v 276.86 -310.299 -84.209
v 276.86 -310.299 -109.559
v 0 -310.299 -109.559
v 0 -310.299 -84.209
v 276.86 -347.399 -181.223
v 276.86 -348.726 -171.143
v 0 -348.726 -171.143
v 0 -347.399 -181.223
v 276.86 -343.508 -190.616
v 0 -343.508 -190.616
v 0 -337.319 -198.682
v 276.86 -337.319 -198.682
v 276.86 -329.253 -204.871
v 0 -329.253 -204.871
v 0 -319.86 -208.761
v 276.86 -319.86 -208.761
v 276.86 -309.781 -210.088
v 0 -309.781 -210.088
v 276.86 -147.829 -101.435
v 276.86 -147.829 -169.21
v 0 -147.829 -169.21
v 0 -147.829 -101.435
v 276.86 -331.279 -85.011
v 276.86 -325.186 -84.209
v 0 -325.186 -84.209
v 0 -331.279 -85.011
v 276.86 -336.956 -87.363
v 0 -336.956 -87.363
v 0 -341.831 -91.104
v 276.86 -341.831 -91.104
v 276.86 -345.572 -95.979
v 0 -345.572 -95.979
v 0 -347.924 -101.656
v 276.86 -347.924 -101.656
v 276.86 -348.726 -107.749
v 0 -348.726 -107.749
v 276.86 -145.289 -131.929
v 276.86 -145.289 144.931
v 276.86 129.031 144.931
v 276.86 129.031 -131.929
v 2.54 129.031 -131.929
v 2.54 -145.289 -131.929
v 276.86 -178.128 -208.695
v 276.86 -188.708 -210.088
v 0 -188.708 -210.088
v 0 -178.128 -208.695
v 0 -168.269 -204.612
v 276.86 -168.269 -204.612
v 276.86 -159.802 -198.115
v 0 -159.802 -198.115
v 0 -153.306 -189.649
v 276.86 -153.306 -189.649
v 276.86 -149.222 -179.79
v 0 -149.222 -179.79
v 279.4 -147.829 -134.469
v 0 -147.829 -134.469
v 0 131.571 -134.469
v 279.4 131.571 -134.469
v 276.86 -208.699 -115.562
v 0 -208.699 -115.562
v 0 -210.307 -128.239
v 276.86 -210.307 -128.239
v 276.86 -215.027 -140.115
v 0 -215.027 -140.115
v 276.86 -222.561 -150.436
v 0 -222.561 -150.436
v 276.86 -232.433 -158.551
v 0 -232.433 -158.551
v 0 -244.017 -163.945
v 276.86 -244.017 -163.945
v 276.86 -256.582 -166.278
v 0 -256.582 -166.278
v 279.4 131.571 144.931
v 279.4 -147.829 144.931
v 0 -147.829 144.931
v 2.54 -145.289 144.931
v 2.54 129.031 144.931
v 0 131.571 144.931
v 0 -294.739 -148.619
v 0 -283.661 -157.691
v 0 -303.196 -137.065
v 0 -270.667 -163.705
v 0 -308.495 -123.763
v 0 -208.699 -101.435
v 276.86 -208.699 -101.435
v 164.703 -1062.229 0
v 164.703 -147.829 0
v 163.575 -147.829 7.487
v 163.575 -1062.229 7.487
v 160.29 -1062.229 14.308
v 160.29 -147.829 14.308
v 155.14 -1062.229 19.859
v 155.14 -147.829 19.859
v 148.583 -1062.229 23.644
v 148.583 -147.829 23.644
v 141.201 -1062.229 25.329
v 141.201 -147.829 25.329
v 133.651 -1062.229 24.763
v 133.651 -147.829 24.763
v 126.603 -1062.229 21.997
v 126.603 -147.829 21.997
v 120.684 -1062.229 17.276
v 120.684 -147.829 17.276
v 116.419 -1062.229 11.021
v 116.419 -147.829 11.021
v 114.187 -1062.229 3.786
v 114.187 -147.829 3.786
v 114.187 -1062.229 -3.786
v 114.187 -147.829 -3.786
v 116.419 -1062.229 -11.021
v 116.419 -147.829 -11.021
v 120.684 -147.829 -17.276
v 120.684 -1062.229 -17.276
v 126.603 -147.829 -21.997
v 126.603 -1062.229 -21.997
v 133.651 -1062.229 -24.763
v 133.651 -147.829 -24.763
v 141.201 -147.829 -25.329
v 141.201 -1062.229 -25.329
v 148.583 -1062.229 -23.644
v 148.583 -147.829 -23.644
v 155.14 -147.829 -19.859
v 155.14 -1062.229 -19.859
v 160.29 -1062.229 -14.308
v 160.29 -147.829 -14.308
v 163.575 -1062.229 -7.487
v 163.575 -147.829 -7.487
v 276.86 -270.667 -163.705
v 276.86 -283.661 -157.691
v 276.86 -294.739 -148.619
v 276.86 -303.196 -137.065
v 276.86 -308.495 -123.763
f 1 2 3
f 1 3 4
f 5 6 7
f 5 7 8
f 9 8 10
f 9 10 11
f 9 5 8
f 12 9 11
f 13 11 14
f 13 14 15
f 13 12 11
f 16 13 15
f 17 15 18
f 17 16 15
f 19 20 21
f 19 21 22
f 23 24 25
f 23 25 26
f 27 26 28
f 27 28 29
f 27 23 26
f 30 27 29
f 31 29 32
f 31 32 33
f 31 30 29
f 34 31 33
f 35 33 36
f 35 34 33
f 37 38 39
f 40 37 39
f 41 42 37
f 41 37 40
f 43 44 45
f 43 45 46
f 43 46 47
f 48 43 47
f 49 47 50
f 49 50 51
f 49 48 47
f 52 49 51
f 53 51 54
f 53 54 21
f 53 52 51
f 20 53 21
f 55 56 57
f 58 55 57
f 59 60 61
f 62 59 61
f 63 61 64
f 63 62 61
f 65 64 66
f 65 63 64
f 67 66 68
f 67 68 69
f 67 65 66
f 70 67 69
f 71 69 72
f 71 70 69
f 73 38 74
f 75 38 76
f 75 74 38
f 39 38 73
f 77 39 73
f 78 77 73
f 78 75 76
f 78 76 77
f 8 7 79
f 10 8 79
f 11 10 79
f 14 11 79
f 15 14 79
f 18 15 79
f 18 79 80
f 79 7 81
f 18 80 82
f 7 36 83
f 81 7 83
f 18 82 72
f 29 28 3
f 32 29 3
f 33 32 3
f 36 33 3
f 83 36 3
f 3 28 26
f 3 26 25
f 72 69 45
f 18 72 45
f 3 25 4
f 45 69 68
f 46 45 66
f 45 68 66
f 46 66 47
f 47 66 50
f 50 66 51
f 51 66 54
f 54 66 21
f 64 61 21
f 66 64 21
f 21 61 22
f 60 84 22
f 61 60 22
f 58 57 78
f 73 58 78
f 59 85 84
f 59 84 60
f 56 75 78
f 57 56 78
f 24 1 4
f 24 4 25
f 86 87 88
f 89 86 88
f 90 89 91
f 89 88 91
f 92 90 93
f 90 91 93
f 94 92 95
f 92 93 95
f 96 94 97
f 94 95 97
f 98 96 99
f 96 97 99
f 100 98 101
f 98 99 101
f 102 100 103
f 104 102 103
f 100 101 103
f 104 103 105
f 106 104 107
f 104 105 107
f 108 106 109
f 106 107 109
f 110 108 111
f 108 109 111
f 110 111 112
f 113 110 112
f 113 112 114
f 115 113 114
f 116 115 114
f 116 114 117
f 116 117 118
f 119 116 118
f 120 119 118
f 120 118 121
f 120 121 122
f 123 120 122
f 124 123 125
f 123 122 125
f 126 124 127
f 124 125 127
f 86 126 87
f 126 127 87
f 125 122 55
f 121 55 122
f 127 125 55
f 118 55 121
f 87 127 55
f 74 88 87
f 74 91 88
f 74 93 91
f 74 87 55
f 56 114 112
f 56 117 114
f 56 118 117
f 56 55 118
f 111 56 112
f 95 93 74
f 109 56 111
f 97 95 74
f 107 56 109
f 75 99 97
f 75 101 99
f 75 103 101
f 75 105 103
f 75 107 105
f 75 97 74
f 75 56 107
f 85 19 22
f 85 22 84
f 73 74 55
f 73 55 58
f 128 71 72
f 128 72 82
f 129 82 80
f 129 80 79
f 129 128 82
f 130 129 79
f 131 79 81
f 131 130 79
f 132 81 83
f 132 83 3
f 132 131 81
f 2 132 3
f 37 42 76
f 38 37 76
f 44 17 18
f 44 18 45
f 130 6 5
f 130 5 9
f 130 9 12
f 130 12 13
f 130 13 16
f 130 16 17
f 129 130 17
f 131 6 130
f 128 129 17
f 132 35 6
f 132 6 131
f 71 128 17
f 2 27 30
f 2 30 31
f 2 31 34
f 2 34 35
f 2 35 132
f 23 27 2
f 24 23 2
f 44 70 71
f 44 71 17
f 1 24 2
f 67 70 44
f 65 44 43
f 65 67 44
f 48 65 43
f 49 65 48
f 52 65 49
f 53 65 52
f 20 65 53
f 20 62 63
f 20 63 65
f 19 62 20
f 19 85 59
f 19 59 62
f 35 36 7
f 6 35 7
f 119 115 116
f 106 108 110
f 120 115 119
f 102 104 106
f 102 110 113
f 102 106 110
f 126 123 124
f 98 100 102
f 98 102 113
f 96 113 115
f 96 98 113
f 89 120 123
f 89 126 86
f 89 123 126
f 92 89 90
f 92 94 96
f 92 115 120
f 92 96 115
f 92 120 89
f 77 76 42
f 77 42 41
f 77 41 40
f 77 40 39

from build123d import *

# Parameters (mm, degrees)
F0_W     = 279.4
F0_H     = 279.4
F1_DEPTH = 279.4
F2_T     = -2.54
F3_R     = 25.4
F4_DEPTH = 914.4
F6_START = -2.54
F6_DEPTH = 276.86


with BuildPart() as f1:
    # F0 (on Right) → F1 (new body)
    with BuildSketch(Plane.YZ):
        with Locations((-8.1293592229, 5.2310257389)):
            Rectangle(F0_W, F0_H)
    extrude(amount=F1_DEPTH)

    # F2
    f2_openings = [f1.faces().sort_by_distance(p)[0] for p in [
        (139.7, -8.129359, 144.931026),
    ]]
    offset(amount=F2_T, openings=f2_openings)

    # F3 (on face) → F4 (join)
    with BuildSketch(Plane.XZ.offset(147.8293592229)):
        with Locations((139.3031475793, 0)):
            Circle(F3_R)
    extrude(amount=F4_DEPTH)


with BuildPart() as f6:
    # F5 (on face) → F6 (new body)
    with BuildSketch(Plane.YZ.offset(279.4).offset(F6_START)):
        with BuildLine():
            Line((-147.8293592229, -169.2097009663), (-147.8293592229, -101.434879005))
            Line((-147.8293592229, -101.434879005), (-208.6994263172, -101.434879005))
            Line((-208.6994263172, -101.434879005), (-208.6994263172, -115.5619577885))
            ThreePointArc((-208.6994263172, -115.5619577885), (-222.5612139186, -150.4361382777), (-256.5816493407, -166.278095038))
            ThreePointArc((-256.5816493407, -166.278095038), (-294.7385959673, -148.6185419879), (-310.2994263172, -109.5586783345))
            Line((-310.2994263172, -109.5586783345), (-310.2994263172, -84.2093378305))
            Line((-310.2994263172, -84.2093378305), (-325.1862112998, -84.2093378305))
            ThreePointArc((-325.1862112998, -84.2093378305), (-341.8311267942, -91.1038875729), (-348.7256765366, -107.7488030673))
            Line((-348.7256765366, -107.7488030673), (-348.7256765366, -171.1432021282))
            ThreePointArc((-348.7256765366, -171.1432021282), (-337.3189046725, -198.6815854653), (-309.7805213354, -210.0883573294))
            Line((-309.7805213354, -210.0883573294), (-188.708015586, -210.0883573294))
            ThreePointArc((-188.708015586, -210.0883573294), (-159.8024404659, -198.1152760864), (-147.8293592229, -169.2097009663))
        make_face()
        with BuildLine():
            ThreePointArc((-259.4994263172, -166.3619577885), (-258.0399353575, -166.3409877727), (-256.5816493407, -166.278095038))
            ThreePointArc((-256.5816493407, -166.278095038), (-255.0394678359, -166.3409882303), (-253.4961468632, -166.3619577885))
            Line((-253.4961468632, -166.3619577885), (-259.4994263172, -166.3619577885))
        make_face(mode=Mode.SUBTRACT)
        with BuildLine():
            ThreePointArc((-253.4961468632, -166.3619577885), (-255.0394678359, -166.3409882303), (-256.5816493407, -166.278095038))
            ThreePointArc((-256.5816493407, -166.278095038), (-258.0399353575, -166.3409877727), (-259.4994263172, -166.3619577885))
            Line((-259.4994263172, -166.3619577885), (-253.4961468632, -166.3619577885))
        make_face()
    extrude(amount=-F6_DEPTH)


solid = Compound([f1.part, f6.part])
